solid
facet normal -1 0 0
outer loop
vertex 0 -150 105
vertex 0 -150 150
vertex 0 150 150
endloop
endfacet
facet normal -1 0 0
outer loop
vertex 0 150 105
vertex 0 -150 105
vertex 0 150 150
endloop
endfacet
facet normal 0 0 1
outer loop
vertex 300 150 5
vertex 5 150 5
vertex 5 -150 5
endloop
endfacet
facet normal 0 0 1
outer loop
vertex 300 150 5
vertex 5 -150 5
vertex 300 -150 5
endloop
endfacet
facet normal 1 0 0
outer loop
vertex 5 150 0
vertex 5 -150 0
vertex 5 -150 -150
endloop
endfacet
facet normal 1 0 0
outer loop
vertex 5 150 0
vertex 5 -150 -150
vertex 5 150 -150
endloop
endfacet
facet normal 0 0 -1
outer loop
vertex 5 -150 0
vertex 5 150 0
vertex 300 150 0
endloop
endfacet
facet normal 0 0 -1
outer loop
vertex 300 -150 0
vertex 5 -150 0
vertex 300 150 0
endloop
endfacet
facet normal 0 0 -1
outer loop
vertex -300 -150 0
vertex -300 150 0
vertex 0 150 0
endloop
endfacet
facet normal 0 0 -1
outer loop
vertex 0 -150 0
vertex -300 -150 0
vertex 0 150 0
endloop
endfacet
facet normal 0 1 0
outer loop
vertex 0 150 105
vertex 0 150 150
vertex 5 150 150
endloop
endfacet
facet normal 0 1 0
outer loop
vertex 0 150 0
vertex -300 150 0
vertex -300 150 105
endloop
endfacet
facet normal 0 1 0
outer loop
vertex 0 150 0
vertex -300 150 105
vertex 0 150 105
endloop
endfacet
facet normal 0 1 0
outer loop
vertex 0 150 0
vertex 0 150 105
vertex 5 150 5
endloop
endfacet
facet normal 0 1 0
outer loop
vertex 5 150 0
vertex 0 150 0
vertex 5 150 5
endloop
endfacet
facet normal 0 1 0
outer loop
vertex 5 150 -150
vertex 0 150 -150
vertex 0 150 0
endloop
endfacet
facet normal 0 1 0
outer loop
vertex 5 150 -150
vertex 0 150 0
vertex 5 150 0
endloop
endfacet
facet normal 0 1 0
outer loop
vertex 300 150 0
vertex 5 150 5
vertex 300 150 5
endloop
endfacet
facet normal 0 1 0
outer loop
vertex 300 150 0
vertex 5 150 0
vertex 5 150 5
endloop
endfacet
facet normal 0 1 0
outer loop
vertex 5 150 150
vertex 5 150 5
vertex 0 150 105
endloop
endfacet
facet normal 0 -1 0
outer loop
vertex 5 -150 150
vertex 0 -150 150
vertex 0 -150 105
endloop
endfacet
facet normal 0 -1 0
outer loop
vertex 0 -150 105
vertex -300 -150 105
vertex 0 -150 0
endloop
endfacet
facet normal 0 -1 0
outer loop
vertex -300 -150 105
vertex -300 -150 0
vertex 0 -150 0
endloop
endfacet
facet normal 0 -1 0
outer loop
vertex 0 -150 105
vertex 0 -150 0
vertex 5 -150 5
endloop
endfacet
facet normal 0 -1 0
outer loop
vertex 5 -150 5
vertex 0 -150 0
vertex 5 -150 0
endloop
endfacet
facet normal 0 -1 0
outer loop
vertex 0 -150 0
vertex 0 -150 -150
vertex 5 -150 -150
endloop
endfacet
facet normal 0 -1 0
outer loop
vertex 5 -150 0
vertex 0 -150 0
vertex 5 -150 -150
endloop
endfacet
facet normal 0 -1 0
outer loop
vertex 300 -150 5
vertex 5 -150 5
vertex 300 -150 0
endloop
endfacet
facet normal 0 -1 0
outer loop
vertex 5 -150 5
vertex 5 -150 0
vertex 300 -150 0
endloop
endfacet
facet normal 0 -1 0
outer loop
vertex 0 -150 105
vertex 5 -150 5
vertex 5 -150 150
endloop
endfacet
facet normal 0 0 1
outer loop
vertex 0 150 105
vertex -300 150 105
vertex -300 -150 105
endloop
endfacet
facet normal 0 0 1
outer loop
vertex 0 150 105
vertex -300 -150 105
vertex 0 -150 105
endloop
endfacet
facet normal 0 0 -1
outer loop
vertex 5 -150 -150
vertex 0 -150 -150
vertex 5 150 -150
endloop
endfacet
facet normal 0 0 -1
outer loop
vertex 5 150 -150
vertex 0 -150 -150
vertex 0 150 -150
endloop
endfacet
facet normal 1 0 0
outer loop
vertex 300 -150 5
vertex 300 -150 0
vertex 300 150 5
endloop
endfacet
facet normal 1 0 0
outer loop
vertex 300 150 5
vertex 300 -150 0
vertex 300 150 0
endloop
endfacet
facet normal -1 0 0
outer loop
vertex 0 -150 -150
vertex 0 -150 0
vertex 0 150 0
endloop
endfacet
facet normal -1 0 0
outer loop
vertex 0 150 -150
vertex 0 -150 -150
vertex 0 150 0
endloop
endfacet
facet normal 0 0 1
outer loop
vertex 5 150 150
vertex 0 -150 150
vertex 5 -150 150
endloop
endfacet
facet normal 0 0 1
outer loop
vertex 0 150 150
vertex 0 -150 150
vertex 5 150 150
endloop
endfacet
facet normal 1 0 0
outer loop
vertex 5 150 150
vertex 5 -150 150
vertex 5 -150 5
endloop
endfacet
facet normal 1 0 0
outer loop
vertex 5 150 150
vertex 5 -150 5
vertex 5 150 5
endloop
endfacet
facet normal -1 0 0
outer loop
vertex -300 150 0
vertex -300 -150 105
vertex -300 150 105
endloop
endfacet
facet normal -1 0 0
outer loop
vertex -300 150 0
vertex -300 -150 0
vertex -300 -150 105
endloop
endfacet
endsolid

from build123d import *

# Parameters (mm, degrees)
F0_W     = 600
F0_H     = 300
F1_DEPTH = 5
F2_W     = 300
F2_H     = 300
F3_DEPTH = 5
F6_W     = 300
F6_H     = 300
F7_DEPTH = 100


# Not quite as in the source:
# - the program builds the solid bodies; features that only make, move or delete a surface that nothing else refers to are left out


with BuildPart() as f1:
    # F0 (on Top) → F1 (new body)
    with BuildSketch(Plane.XY):
        Rectangle(F0_W, F0_H)
    extrude(amount=F1_DEPTH)

    # F2 (on Right) → F3 (join)
    with BuildSketch(Plane.YZ):
        Rectangle(F2_W, F2_H)
    extrude(amount=F3_DEPTH)

    # F6 (on face) → F7 (join)
    with BuildSketch(Plane.XY.offset(5)):
        with Locations((-150, 0)):
            Rectangle(F6_W, F6_H)
    extrude(amount=F7_DEPTH)


solid = f1.part
